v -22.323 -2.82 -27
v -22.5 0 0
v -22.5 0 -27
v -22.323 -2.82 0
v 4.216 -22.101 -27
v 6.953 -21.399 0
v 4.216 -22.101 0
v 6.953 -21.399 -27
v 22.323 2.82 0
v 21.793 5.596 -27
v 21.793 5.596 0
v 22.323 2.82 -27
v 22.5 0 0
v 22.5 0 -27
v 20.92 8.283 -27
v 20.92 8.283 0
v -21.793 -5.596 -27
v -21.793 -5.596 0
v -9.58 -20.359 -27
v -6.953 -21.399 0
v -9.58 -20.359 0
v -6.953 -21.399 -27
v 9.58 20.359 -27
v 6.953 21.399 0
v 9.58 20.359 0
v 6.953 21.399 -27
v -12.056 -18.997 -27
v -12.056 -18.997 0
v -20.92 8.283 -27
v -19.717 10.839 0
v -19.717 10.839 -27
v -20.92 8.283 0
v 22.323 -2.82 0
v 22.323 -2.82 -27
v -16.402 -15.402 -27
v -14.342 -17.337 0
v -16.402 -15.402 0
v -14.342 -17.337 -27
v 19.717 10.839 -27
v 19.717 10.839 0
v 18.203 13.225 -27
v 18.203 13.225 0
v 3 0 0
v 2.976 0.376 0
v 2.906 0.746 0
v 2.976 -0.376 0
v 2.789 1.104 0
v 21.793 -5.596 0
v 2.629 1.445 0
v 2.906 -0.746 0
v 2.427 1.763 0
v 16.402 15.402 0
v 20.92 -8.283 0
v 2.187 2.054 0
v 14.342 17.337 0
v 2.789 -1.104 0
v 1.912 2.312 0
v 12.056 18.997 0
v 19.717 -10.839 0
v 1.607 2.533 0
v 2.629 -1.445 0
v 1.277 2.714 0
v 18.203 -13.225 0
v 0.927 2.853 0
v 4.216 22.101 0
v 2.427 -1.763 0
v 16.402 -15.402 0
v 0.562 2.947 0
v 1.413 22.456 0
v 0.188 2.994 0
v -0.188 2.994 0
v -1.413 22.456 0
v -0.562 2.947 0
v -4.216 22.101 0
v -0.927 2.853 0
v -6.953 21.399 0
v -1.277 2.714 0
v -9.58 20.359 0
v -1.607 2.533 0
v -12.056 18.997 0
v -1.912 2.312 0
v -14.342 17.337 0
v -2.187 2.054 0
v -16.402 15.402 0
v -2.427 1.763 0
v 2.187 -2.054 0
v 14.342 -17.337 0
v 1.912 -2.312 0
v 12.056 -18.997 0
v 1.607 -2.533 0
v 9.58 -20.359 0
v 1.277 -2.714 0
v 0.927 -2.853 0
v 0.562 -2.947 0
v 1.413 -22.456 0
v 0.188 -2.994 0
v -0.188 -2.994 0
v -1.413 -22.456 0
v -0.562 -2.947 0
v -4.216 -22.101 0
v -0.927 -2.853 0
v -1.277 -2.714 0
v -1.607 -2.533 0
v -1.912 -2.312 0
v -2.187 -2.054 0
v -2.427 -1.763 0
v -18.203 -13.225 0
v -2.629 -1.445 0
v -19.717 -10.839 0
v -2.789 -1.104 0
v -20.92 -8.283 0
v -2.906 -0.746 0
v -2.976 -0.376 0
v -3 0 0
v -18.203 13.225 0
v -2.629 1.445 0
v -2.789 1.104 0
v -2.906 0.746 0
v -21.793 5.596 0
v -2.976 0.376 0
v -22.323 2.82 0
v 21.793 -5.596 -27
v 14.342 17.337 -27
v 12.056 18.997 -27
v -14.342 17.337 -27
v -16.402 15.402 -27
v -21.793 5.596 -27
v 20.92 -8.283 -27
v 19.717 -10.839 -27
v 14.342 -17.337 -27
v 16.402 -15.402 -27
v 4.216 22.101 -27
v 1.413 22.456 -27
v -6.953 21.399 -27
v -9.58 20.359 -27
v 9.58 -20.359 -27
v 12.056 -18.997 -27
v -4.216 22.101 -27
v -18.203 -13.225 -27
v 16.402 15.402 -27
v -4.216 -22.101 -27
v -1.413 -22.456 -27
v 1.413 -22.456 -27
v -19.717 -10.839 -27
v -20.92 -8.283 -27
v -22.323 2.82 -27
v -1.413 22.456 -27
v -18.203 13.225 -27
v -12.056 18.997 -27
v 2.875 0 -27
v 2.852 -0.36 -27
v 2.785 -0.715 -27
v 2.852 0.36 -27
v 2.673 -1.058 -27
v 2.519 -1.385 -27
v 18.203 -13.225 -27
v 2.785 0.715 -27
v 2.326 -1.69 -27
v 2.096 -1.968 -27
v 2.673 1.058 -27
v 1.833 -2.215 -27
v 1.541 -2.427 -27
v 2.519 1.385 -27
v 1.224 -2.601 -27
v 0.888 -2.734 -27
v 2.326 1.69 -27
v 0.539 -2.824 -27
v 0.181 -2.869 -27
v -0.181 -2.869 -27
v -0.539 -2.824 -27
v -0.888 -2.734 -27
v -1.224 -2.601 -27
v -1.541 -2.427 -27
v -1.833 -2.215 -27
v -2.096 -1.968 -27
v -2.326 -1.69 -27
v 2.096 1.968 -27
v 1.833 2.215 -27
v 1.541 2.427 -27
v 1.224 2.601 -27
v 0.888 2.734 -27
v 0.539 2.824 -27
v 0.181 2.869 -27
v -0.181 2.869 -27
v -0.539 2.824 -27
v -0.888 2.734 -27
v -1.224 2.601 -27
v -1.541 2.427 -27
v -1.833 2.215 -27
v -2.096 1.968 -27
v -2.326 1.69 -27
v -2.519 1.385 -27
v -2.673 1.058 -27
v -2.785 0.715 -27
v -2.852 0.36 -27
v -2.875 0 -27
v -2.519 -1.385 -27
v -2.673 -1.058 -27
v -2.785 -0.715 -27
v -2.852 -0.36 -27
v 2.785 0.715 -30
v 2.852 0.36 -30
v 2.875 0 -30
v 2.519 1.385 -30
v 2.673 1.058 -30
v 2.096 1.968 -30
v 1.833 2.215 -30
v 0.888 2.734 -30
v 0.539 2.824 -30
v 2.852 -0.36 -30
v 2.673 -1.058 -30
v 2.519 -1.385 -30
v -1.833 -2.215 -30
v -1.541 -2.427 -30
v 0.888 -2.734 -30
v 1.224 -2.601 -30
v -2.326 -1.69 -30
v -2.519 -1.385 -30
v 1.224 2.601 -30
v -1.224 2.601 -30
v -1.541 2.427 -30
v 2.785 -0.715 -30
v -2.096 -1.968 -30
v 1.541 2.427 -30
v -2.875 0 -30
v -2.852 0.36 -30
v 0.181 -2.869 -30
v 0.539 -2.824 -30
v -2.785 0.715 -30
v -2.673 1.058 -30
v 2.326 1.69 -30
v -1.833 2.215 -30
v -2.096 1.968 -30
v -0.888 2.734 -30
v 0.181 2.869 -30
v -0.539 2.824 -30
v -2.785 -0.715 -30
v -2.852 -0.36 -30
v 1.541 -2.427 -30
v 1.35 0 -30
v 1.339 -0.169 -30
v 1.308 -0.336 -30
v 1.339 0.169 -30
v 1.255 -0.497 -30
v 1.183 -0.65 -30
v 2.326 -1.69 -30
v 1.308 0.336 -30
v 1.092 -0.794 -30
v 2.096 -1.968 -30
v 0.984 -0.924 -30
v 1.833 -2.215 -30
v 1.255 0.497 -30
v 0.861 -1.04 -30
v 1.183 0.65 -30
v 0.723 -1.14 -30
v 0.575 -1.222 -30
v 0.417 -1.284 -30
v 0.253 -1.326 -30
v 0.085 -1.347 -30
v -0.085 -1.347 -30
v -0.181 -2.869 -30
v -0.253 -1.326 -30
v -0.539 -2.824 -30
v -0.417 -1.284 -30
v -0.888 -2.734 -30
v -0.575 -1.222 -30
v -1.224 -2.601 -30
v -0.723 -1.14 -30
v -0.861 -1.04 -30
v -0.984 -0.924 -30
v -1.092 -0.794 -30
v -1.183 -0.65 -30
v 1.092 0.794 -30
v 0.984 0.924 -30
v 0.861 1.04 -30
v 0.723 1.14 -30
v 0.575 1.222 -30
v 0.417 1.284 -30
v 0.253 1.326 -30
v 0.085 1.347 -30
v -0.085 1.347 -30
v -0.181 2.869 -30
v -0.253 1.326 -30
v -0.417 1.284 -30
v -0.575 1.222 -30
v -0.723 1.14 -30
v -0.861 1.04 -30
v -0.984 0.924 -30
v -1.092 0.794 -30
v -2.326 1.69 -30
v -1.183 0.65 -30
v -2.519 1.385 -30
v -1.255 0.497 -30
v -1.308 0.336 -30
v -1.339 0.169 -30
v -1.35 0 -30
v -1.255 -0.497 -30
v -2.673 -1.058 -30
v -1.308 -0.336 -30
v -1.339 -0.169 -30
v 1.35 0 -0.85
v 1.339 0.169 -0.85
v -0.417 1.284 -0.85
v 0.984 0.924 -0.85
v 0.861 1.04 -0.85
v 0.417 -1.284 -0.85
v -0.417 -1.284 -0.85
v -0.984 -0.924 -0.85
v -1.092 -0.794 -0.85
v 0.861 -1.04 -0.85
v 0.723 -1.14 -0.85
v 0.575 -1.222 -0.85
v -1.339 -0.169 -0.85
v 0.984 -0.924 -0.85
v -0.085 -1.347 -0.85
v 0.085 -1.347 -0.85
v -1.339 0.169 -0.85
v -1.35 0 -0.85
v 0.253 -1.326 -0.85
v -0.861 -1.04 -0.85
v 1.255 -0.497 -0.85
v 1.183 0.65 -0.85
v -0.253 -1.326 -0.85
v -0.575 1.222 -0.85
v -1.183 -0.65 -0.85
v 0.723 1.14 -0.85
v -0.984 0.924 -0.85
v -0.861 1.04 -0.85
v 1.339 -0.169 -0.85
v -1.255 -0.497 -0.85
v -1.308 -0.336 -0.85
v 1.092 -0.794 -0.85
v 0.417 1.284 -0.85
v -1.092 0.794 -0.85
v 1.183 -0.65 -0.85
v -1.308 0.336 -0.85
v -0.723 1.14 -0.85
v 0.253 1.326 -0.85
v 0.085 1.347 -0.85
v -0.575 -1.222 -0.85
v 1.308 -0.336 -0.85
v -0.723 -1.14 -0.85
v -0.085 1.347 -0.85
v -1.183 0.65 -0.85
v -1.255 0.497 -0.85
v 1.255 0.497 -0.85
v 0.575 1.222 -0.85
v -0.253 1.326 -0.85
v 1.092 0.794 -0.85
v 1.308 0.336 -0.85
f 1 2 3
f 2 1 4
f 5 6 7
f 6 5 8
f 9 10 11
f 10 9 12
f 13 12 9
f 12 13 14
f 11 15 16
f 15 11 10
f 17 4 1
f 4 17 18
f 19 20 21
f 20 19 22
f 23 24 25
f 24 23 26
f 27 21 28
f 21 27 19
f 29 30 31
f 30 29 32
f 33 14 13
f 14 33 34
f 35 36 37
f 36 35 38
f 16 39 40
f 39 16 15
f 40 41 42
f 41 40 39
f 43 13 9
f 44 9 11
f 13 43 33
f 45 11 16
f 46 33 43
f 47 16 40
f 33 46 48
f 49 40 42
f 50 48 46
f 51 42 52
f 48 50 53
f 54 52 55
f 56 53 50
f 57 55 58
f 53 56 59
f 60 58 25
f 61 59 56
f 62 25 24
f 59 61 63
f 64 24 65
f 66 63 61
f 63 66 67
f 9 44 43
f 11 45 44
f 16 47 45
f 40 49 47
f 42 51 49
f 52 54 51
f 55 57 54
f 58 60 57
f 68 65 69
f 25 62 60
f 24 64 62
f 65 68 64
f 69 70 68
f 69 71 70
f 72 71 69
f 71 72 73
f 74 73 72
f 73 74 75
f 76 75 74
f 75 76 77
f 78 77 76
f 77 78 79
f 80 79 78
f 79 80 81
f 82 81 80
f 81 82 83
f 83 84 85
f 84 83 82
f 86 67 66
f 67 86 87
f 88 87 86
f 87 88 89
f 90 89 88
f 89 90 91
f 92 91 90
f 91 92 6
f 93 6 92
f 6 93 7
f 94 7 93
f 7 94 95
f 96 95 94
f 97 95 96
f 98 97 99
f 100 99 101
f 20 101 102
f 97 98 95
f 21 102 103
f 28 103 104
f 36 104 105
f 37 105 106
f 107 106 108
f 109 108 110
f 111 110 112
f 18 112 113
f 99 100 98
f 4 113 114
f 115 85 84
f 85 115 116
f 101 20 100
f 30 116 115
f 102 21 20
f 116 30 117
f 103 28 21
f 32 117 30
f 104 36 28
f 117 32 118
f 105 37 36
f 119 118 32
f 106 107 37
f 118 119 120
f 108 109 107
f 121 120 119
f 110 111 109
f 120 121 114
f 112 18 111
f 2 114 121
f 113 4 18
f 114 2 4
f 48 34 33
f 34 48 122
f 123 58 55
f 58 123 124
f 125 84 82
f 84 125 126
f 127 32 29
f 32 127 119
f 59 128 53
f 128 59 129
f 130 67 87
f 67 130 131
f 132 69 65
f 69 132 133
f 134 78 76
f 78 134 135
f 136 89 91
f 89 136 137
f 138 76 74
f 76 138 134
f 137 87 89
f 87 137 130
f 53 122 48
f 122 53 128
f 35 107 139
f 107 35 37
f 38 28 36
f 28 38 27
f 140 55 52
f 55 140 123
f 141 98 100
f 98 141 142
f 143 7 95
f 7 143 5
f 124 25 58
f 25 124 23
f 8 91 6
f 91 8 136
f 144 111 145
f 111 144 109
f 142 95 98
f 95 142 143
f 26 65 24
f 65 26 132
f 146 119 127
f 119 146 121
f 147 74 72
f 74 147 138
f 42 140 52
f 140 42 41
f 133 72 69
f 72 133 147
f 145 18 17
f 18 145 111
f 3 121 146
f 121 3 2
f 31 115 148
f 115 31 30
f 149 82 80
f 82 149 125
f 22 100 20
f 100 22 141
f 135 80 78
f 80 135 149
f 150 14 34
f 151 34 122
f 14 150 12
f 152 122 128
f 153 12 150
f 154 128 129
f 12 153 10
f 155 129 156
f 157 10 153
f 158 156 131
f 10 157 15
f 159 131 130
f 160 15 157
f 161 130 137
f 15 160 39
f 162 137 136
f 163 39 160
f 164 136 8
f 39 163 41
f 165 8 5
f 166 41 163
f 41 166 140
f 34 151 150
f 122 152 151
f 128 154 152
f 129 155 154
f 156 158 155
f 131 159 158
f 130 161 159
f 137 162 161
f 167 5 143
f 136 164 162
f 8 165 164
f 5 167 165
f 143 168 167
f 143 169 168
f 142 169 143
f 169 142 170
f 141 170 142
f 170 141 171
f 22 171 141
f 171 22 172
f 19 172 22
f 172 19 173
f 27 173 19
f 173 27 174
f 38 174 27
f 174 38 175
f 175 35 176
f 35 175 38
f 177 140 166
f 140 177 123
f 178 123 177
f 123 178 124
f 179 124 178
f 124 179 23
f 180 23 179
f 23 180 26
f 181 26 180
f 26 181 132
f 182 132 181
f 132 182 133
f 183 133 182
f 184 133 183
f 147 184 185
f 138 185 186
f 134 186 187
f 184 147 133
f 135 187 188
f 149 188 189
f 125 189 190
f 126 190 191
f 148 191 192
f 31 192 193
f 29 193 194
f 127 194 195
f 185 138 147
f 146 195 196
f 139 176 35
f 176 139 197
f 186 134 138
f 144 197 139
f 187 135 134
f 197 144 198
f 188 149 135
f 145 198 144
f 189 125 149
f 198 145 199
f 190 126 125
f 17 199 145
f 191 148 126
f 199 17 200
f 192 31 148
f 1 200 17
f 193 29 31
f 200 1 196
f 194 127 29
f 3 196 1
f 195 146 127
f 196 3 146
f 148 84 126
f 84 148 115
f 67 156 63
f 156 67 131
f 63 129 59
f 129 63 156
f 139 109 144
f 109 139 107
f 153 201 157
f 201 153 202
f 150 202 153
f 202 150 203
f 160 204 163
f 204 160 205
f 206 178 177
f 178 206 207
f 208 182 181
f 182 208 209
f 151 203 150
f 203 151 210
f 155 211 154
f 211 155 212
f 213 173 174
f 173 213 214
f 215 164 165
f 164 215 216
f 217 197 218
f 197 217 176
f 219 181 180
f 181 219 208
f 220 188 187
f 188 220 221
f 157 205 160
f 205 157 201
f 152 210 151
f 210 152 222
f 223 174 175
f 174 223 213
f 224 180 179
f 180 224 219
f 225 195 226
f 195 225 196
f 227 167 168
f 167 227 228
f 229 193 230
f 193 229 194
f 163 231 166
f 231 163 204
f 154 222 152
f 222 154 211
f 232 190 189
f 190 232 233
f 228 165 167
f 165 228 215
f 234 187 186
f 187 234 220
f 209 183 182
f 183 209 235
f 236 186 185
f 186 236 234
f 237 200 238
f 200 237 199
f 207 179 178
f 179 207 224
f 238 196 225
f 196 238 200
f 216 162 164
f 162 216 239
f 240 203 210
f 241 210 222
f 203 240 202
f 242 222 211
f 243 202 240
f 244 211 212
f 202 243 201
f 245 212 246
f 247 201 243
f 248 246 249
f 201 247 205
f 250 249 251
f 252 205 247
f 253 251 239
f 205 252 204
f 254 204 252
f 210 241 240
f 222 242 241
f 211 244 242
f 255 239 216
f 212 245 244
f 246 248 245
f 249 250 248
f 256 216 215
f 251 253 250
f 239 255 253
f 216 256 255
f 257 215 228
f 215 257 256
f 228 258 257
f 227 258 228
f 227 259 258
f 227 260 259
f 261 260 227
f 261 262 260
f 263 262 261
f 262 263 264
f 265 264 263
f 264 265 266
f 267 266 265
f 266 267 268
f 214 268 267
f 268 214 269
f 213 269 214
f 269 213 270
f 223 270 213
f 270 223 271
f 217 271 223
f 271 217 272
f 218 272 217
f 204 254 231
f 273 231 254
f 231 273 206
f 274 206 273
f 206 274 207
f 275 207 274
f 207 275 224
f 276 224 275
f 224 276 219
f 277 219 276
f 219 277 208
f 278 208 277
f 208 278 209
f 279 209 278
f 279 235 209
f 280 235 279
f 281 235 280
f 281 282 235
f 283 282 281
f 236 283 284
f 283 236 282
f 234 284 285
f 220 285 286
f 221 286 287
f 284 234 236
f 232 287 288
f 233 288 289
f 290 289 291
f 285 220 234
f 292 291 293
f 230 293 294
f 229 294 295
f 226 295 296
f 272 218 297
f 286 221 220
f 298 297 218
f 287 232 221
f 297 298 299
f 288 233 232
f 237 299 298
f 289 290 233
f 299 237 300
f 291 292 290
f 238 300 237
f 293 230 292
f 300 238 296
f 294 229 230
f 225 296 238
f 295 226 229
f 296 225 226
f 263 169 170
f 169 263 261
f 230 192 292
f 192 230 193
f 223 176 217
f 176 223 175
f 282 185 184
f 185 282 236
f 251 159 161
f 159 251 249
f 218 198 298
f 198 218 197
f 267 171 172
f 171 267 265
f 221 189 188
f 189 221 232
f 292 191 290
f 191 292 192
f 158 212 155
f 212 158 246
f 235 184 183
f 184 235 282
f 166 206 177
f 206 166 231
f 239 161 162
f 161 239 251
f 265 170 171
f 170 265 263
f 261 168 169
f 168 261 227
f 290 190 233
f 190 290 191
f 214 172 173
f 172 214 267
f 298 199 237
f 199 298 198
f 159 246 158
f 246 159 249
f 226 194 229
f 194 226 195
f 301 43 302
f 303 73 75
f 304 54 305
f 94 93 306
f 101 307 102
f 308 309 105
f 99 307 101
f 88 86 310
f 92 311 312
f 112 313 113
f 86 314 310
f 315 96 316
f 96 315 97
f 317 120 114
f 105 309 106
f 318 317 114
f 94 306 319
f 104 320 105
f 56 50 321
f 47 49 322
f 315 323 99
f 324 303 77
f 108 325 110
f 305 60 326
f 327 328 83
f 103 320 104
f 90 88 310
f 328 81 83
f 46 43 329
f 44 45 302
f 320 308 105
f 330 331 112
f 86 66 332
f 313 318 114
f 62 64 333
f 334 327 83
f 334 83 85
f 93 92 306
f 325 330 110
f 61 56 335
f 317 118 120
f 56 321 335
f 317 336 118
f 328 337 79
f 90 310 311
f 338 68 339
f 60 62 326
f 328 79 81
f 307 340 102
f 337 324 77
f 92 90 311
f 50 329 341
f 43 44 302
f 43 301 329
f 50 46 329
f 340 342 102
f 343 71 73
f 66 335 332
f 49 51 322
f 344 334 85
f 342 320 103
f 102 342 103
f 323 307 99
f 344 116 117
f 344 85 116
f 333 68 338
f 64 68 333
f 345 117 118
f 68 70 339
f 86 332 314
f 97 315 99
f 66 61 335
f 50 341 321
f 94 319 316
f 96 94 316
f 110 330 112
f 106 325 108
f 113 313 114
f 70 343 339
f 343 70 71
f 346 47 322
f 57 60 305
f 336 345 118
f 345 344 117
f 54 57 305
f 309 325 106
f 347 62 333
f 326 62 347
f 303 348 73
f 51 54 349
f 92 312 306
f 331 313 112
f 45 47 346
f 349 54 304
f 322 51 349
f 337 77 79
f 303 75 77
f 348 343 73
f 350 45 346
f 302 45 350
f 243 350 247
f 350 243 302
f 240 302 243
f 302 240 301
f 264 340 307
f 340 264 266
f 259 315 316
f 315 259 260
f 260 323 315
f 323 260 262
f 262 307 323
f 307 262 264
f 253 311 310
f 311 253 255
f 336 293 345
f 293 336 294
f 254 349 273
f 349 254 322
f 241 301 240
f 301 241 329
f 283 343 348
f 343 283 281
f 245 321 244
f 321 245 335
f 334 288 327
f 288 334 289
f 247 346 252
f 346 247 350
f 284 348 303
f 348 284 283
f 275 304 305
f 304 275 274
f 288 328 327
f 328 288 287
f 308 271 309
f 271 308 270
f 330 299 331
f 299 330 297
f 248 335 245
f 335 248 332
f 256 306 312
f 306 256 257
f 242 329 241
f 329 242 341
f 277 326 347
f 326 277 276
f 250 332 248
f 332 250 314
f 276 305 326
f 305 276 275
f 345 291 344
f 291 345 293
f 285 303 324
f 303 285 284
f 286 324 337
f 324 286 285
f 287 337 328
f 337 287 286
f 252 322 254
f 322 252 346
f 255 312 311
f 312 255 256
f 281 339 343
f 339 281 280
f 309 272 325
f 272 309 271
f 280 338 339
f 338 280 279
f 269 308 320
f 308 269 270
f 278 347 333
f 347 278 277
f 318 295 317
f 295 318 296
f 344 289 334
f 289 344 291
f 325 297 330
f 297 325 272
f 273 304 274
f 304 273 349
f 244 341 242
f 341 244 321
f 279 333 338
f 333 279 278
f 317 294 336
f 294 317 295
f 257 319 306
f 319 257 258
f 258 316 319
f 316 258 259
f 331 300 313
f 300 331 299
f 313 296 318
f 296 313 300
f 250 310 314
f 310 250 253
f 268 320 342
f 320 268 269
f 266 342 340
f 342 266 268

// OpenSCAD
$fn = 50;

difference() {
	union() {
		translate(v = [0, 0, -27.0]) {
			cylinder(h = 27, r = 22.5);
		}
		#translate(v = [0, 0, -30.0]) {
			cylinder(h = 30, r = 2.875);
		}
	}
	union() {
		translate(v = [0, 0, 0]) {
			rotate(a = [0, 0, 0]) {
				difference() {
					union() {
						translate(v = [0, 0, -30.0]) {
							cylinder(h = 30, r = 1.0);
						}
						translate(v = [0, 0, -0.85]) {
							cylinder(h = 0.85, r1 = 1.35, r2 = 3.0);
						}
						translate(v = [0, 0, -30.0]) {
							cylinder(h = 30, r = 1.35);
						}
						translate(v = [0, 0, -30.0]) {
							cylinder(h = 30, r = 1.0);
						}
					}
					union();
				}
			}
		}
	}
}
